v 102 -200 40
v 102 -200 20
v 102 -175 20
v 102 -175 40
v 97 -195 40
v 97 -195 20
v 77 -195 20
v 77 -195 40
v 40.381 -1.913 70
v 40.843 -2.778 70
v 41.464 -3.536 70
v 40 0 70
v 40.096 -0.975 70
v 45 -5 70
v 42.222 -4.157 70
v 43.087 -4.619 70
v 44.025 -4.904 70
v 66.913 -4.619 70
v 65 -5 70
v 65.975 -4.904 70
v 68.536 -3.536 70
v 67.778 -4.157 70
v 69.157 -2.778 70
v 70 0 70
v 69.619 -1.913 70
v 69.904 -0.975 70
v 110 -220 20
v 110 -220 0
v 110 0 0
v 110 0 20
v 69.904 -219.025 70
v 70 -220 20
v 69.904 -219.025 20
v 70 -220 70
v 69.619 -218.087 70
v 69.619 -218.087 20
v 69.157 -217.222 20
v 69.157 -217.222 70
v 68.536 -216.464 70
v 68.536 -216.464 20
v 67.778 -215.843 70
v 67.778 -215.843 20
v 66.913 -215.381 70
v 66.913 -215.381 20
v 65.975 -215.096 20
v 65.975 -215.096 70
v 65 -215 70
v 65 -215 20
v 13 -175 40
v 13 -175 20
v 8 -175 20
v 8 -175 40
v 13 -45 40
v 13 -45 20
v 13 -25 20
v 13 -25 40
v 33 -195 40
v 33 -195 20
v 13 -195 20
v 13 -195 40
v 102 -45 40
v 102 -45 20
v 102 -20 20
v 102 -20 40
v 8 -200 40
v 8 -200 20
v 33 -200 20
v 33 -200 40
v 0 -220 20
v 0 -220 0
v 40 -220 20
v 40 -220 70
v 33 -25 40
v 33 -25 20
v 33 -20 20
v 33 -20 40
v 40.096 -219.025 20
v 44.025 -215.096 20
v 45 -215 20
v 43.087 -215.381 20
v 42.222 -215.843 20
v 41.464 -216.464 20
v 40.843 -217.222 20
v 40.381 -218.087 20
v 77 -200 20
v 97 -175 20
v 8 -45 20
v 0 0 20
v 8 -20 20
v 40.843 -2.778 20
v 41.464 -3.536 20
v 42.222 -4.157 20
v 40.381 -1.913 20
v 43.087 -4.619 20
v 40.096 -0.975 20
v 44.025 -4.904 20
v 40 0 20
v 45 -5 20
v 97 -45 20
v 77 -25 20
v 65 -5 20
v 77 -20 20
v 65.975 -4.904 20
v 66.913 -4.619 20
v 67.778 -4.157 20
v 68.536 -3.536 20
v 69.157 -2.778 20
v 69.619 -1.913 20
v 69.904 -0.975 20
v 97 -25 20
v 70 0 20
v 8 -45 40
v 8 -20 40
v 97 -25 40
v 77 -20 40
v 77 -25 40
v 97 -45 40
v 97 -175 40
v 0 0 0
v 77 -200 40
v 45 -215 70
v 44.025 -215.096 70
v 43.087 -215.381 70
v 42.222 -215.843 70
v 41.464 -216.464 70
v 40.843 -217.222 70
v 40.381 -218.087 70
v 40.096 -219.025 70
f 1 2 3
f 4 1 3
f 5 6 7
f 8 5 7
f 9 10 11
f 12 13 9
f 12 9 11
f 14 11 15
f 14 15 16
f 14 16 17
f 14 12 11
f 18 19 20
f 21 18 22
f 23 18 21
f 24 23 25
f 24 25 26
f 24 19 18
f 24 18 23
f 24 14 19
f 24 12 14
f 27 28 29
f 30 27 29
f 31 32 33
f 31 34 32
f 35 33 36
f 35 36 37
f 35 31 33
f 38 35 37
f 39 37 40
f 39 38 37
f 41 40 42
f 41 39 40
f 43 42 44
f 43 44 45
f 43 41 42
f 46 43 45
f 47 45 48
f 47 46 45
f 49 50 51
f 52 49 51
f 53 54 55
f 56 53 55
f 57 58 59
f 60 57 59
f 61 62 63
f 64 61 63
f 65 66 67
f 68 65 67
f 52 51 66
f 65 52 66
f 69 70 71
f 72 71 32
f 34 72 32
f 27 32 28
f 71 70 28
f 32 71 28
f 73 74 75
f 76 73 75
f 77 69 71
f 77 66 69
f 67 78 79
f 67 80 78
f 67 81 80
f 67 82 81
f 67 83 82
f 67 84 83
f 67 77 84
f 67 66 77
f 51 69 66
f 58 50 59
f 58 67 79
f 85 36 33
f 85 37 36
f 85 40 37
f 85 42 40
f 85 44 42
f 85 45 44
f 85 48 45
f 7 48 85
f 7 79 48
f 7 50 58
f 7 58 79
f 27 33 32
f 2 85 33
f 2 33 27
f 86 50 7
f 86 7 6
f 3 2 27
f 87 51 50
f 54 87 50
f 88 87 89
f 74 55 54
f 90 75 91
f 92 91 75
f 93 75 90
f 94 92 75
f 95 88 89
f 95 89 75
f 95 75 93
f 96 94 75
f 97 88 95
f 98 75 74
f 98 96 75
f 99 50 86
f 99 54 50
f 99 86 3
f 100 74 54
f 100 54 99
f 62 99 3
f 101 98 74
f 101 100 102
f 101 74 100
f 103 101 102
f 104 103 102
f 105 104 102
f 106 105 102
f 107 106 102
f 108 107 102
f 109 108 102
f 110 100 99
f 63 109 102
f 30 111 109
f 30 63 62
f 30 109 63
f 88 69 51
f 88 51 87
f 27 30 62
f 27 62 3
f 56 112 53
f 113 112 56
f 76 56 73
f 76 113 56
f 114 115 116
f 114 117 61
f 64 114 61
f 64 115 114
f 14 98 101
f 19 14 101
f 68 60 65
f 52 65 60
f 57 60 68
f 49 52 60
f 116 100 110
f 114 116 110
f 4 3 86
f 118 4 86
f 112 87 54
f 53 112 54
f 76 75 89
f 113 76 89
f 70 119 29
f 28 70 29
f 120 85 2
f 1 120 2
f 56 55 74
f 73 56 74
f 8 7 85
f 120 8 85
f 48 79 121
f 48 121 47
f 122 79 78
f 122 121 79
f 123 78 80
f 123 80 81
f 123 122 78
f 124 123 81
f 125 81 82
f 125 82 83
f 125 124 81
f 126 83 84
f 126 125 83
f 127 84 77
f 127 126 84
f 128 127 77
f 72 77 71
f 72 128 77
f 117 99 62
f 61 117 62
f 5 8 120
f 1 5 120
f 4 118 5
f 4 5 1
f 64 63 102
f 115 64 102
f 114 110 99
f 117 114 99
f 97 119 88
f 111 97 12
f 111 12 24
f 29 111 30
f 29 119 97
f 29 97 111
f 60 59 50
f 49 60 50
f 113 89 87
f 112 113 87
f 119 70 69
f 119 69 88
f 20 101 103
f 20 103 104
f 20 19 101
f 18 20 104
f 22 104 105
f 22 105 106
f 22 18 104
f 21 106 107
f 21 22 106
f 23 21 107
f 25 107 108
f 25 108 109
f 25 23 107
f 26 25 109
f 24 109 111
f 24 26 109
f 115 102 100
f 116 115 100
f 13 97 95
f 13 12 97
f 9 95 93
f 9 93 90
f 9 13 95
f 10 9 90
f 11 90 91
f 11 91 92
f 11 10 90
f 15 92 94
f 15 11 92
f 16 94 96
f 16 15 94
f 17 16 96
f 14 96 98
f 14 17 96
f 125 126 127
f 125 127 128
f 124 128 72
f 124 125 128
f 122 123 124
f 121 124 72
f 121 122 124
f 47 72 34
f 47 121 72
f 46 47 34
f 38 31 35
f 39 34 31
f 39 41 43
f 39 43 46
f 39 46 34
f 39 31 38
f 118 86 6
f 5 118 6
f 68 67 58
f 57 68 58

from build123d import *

# Parameters (mm, degrees)
F0_W     = 110
F0_H     = 220
F1_DEPTH = 20
F3_DEPTH = 20
F4_W     = 30
F4_H     = 5
F5_DEPTH = 50
F6_R     = 4.99999


# Not quite as in the source:
# - a fillet or chamfer is up to 0.001 mm smaller than in the source, because OpenCascade refuses the exact size


with BuildPart() as f1:
    # F0 (on Top) → F1 (new body)
    with BuildSketch(Plane.XY):
        with Locations((55, -110)):
            Rectangle(F0_W, F0_H)
    extrude(amount=F1_DEPTH)

    # F2 (on face) → F3 (join)
    with BuildSketch(Plane.XY.offset(20)):
        Polygon((8, -20), (8, -45), (13, -45), (13, -25), (33, -25), (33, -20), align=None)
        Polygon((77, -20), (77, -25), (97, -25), (97, -45), (102, -45), (102, -20), align=None)
        Polygon((33, -200), (33, -195), (13, -195), (13, -175), (8, -175), (8, -200), align=None)
        Polygon((97, -175), (97, -195), (77, -195), (77, -200), (102, -200), (102, -175), align=None)
    extrude(amount=F3_DEPTH)

    # F4 (on face) → F5 (join)
    with BuildSketch(Plane.XY.offset(20)):
        with Locations((55, -2.5)):
            Rectangle(F4_W, F4_H)
        with Locations((55, -217.5)):
            Rectangle(F4_W, F4_H)
    extrude(amount=F5_DEPTH)

    # F6 (radius 5 in the source; OpenCascade refuses exactly that, so slightly less here)
    f6_edges = [f1.edges().sort_by_distance(p)[0] for p in [
        (40, -5, 45),
        (70, -5, 45),
        (40, -215, 45),
        (70, -215, 45),
    ]]
    fillet(f6_edges, radius=F6_R)


solid = f1.part
